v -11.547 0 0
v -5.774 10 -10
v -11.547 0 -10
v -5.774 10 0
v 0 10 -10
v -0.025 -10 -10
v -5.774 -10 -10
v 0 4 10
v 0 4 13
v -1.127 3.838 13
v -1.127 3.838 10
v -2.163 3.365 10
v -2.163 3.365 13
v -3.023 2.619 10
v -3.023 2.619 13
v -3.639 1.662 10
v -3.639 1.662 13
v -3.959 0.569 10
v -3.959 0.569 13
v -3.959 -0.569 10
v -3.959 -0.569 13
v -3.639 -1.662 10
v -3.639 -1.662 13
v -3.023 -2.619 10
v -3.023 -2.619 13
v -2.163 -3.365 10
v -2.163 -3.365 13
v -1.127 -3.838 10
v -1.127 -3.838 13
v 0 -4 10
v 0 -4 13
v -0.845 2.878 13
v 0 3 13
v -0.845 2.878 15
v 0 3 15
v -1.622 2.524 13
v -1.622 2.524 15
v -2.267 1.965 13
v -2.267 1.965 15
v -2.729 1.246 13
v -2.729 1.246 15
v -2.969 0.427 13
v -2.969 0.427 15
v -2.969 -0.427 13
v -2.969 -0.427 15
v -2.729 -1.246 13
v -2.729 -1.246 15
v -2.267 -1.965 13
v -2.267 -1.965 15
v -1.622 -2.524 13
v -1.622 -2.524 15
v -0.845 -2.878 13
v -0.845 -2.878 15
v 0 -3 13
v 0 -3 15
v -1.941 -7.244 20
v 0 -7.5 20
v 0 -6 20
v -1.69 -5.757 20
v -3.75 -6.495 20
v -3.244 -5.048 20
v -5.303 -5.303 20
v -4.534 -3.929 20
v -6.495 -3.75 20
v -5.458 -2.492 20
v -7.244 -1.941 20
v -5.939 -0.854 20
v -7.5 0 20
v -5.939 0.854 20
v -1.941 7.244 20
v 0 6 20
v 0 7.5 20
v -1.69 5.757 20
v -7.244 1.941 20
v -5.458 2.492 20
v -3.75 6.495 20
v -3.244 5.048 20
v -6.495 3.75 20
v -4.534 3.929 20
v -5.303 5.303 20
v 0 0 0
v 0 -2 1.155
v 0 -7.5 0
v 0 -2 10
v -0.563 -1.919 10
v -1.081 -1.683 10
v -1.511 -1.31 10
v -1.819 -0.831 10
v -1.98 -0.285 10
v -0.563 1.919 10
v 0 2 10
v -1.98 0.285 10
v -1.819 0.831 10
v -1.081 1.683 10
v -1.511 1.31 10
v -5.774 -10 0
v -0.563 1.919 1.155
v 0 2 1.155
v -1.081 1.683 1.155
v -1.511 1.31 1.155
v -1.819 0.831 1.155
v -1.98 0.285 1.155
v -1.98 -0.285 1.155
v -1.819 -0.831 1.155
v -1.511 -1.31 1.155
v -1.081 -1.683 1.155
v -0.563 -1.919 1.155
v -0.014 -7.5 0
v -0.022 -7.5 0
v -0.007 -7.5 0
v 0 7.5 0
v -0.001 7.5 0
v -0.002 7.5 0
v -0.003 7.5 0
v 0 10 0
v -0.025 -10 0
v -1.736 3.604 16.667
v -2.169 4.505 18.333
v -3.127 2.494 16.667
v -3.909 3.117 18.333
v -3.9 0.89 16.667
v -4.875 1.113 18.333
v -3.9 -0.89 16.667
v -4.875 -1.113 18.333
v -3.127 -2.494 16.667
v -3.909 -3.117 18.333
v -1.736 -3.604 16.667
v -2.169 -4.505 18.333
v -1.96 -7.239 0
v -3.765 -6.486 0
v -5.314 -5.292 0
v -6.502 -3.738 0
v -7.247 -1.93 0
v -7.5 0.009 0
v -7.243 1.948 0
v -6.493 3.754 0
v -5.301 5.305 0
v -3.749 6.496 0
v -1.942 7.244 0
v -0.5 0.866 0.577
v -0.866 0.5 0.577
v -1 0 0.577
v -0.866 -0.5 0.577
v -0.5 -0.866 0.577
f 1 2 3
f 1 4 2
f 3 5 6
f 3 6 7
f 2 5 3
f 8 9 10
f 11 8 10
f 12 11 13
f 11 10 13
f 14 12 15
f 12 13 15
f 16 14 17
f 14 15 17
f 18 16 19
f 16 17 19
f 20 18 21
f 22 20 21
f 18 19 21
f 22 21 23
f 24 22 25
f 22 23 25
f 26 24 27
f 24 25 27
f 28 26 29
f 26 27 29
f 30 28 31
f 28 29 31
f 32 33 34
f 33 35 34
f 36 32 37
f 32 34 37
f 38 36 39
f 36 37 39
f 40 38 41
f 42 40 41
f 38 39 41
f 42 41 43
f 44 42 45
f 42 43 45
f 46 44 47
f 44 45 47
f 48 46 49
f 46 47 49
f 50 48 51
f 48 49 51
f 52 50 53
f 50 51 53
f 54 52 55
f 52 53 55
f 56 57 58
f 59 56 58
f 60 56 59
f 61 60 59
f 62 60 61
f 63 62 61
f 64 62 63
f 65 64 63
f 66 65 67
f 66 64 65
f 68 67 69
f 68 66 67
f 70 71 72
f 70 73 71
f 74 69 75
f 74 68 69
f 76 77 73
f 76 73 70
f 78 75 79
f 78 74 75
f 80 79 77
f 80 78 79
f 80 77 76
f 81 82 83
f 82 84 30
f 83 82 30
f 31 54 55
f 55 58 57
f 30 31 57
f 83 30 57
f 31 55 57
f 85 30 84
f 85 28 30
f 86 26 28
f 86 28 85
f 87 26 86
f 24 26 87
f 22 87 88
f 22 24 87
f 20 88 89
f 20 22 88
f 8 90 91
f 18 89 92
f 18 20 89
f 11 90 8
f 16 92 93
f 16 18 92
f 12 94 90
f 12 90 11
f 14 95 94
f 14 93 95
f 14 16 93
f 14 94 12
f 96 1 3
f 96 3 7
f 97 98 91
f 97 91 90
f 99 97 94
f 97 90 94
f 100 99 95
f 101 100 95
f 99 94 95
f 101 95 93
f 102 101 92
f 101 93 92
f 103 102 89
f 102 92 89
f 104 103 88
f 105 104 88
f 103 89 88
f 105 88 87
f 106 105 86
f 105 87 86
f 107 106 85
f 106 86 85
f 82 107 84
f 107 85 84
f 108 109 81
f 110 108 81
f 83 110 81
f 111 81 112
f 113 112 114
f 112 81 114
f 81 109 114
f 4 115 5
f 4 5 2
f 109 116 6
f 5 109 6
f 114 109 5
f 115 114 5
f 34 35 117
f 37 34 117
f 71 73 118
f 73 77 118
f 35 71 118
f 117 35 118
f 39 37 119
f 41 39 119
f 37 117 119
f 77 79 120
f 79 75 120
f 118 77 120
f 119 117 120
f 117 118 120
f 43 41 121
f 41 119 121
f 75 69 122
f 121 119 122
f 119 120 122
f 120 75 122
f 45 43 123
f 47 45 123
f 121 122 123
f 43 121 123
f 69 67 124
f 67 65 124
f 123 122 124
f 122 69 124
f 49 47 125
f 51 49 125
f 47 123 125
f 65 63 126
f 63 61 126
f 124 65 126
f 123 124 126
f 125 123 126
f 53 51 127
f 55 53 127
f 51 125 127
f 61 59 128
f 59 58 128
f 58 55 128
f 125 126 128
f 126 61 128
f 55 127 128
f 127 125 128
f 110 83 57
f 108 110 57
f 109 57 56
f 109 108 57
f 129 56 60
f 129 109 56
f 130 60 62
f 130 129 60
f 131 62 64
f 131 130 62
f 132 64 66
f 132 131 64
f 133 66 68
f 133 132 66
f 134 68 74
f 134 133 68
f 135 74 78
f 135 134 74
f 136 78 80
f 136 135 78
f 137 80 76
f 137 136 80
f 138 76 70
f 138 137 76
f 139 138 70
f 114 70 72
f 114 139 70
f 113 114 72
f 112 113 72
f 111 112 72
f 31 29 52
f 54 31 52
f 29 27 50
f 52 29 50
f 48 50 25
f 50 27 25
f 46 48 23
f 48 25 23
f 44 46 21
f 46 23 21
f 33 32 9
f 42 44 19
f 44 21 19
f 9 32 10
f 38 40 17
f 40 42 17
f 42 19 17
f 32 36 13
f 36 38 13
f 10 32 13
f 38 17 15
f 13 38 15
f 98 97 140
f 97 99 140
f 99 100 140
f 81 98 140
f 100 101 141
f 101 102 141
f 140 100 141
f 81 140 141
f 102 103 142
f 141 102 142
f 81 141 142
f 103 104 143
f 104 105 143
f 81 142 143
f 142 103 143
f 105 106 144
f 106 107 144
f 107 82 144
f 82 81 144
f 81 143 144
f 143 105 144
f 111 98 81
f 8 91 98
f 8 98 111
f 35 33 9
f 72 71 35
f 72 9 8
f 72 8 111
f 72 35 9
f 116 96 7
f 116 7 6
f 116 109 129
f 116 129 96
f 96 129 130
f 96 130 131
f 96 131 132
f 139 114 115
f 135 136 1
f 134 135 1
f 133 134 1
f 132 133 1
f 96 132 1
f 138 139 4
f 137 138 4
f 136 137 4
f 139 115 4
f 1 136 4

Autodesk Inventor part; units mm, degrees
ref_plane "YZ Plane" through (0, 0, 0) normal (1, 0, 0) x (0, 1, 0)
ref_plane "XZ Plane" through (0, 0, 0) normal (0, 1, 0) x (-1, 0, 0)
ref_plane "XY Plane" through (0, 0, 0) normal (0, 0, 1) x (1, 0, 0)
sketch "草圖1" plane through (0, 0, 0) normal (1, 0, 0) x (0, 1, 0)
  line L0 (2, 1.1547) -> (2, 10)
  line L1 (2, 10) -> (4, 10)
  line L2 (4, 10) -> (4, 13)
  line L3 (3, 15) -> (6, 20)
  line L4 (6, 20) -> (7.5, 20)
  arc A0 (7.3358, 14.0988) -> (7.3358, 14.0988) centre (-51.8892, 10.8387) ccw
  line L5 (7.5, 20) -> (7.5, 0)
  line L6 (0, -10) -> (0, 12.2342)
  line L7 (4, 13) -> (3, 13)
  line L8 (3, 13) -> (3, 15)
  line L9 (2, 1.1547) -> (0, 0)
  line L10 (0, 0) -> (7.5, 0)
  dimension "d3" = 8
  dimension "d4" = 4
  dimension "d5" = 15
  dimension "d6" = 12
  dimension "d7" = 6
  dimension "d8" = 5
  dimension "d9" = 7
  dimension "d10" = 3
  dimension "d11" = 0
  dimension "d19" = 20
  dimension "d24" = 20
  dimension "d25" = 0
  dimension "d27" = 60
revolve "迴轉1" add sketch "草圖1" angle 180 about axis through (0, 0, -10) along (0, 0, 1) picked at (3.6603, 4.915) contours L0 L1 L2 L7 L8 L3 L4 A0 L10 L9 | A0 L4 L5 L10
sketch "草圖3" plane through (0, 0, 0) normal (0, 0, -1) x (-1, 0, 0)
  line L0 (0, -7.5) -> (0, 0) projected
  arc A0 (0, -7.5) -> (0, 7.5) centre (0, 0) ccw projected
  line L1 (-11.5773, 0) -> (12.4556, 0) construction
  line L2 (0.0279, 7.6444) -> (0.0279, -10.5735) construction
  line L3 (5.7735, 10) -> (11.547, 0)
  line L4 (11.547, 0) -> (5.7735, -10)
  line L5 (5.7735, -10) -> (0.0248, -10)
  line L6 (0, 10) -> (5.7735, 10)
  line L7 (-0.0017, 11.3448) -> (0.0279, -12.4793) construction
  line L8 (0.0248, -10) -> (0, 10)
  point P0 (6.4952, 3.75)
  dimension "d29" = 20
  dimension "d32" = 2.5
extrude "擠出1" add sketch "草圖3" along normal blind 10
properties part number "示範一"
